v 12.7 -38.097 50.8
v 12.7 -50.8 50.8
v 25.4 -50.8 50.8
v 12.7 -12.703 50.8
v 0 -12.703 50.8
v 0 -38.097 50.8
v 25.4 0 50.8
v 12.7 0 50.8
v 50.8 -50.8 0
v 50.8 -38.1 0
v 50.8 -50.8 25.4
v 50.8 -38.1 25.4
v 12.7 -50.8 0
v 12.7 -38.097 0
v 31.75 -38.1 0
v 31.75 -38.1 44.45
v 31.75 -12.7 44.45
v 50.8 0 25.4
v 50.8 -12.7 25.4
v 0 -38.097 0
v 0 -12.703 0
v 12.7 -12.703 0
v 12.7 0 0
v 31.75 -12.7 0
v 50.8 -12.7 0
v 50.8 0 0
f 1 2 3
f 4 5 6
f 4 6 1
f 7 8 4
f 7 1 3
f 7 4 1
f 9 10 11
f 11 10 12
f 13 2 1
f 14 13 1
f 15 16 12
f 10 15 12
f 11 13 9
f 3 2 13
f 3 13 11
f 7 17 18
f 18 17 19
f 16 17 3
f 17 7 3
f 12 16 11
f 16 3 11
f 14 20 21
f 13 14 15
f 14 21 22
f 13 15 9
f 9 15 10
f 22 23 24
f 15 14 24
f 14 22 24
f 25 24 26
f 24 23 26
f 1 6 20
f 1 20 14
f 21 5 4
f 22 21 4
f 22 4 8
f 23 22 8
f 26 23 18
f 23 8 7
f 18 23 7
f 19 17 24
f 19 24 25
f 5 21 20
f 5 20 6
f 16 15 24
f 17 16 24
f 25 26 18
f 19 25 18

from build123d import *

# Parameters (mm, degrees)
F0_W     = 50.8
F0_H     = 50.8
F1_DEPTH = 50.8
F3_DEPTH = 50.801
F4_W     = 12.7
F4_H     = 12.7030098811
F5_DEPTH = 50.801
F7_W     = 19.05
F7_H     = 25.4
F8_DEPTH = 76.201


with BuildPart() as f1:
    # F0 (on Front) → F1 (new body)
    with BuildSketch(Plane.XZ):
        with Locations((25.4, 25.4)):
            Rectangle(F0_W, F0_H)
    extrude(amount=F1_DEPTH)

    # F2 (on face) → F3 (cut, through all)
    with BuildSketch(Plane.XZ.offset(50.8)):
        Polygon((50.8, 50.8), (25.4, 50.8), (50.8, 25.4), align=None)
    extrude(amount=-F3_DEPTH, mode=Mode.SUBTRACT)

    # F4 (on face) → F5 (cut, through all)
    with BuildSketch(Plane.XY.offset(50.8)):
        with Locations((6.35, -6.3515049405)):
            Rectangle(F4_W, F4_H)
        with Locations((6.35, -44.4484950595)):
            Rectangle(F4_W, F4_H)
    extrude(amount=-F5_DEPTH, mode=Mode.SUBTRACT)

    # F7 (on offset) → F8 (cut, through all)
    with BuildSketch(Plane.XY.offset(76.2)):
        with Locations((41.275, -25.4)):
            Rectangle(F7_W, F7_H)
    extrude(amount=-F8_DEPTH, mode=Mode.SUBTRACT)


solid = f1.part
